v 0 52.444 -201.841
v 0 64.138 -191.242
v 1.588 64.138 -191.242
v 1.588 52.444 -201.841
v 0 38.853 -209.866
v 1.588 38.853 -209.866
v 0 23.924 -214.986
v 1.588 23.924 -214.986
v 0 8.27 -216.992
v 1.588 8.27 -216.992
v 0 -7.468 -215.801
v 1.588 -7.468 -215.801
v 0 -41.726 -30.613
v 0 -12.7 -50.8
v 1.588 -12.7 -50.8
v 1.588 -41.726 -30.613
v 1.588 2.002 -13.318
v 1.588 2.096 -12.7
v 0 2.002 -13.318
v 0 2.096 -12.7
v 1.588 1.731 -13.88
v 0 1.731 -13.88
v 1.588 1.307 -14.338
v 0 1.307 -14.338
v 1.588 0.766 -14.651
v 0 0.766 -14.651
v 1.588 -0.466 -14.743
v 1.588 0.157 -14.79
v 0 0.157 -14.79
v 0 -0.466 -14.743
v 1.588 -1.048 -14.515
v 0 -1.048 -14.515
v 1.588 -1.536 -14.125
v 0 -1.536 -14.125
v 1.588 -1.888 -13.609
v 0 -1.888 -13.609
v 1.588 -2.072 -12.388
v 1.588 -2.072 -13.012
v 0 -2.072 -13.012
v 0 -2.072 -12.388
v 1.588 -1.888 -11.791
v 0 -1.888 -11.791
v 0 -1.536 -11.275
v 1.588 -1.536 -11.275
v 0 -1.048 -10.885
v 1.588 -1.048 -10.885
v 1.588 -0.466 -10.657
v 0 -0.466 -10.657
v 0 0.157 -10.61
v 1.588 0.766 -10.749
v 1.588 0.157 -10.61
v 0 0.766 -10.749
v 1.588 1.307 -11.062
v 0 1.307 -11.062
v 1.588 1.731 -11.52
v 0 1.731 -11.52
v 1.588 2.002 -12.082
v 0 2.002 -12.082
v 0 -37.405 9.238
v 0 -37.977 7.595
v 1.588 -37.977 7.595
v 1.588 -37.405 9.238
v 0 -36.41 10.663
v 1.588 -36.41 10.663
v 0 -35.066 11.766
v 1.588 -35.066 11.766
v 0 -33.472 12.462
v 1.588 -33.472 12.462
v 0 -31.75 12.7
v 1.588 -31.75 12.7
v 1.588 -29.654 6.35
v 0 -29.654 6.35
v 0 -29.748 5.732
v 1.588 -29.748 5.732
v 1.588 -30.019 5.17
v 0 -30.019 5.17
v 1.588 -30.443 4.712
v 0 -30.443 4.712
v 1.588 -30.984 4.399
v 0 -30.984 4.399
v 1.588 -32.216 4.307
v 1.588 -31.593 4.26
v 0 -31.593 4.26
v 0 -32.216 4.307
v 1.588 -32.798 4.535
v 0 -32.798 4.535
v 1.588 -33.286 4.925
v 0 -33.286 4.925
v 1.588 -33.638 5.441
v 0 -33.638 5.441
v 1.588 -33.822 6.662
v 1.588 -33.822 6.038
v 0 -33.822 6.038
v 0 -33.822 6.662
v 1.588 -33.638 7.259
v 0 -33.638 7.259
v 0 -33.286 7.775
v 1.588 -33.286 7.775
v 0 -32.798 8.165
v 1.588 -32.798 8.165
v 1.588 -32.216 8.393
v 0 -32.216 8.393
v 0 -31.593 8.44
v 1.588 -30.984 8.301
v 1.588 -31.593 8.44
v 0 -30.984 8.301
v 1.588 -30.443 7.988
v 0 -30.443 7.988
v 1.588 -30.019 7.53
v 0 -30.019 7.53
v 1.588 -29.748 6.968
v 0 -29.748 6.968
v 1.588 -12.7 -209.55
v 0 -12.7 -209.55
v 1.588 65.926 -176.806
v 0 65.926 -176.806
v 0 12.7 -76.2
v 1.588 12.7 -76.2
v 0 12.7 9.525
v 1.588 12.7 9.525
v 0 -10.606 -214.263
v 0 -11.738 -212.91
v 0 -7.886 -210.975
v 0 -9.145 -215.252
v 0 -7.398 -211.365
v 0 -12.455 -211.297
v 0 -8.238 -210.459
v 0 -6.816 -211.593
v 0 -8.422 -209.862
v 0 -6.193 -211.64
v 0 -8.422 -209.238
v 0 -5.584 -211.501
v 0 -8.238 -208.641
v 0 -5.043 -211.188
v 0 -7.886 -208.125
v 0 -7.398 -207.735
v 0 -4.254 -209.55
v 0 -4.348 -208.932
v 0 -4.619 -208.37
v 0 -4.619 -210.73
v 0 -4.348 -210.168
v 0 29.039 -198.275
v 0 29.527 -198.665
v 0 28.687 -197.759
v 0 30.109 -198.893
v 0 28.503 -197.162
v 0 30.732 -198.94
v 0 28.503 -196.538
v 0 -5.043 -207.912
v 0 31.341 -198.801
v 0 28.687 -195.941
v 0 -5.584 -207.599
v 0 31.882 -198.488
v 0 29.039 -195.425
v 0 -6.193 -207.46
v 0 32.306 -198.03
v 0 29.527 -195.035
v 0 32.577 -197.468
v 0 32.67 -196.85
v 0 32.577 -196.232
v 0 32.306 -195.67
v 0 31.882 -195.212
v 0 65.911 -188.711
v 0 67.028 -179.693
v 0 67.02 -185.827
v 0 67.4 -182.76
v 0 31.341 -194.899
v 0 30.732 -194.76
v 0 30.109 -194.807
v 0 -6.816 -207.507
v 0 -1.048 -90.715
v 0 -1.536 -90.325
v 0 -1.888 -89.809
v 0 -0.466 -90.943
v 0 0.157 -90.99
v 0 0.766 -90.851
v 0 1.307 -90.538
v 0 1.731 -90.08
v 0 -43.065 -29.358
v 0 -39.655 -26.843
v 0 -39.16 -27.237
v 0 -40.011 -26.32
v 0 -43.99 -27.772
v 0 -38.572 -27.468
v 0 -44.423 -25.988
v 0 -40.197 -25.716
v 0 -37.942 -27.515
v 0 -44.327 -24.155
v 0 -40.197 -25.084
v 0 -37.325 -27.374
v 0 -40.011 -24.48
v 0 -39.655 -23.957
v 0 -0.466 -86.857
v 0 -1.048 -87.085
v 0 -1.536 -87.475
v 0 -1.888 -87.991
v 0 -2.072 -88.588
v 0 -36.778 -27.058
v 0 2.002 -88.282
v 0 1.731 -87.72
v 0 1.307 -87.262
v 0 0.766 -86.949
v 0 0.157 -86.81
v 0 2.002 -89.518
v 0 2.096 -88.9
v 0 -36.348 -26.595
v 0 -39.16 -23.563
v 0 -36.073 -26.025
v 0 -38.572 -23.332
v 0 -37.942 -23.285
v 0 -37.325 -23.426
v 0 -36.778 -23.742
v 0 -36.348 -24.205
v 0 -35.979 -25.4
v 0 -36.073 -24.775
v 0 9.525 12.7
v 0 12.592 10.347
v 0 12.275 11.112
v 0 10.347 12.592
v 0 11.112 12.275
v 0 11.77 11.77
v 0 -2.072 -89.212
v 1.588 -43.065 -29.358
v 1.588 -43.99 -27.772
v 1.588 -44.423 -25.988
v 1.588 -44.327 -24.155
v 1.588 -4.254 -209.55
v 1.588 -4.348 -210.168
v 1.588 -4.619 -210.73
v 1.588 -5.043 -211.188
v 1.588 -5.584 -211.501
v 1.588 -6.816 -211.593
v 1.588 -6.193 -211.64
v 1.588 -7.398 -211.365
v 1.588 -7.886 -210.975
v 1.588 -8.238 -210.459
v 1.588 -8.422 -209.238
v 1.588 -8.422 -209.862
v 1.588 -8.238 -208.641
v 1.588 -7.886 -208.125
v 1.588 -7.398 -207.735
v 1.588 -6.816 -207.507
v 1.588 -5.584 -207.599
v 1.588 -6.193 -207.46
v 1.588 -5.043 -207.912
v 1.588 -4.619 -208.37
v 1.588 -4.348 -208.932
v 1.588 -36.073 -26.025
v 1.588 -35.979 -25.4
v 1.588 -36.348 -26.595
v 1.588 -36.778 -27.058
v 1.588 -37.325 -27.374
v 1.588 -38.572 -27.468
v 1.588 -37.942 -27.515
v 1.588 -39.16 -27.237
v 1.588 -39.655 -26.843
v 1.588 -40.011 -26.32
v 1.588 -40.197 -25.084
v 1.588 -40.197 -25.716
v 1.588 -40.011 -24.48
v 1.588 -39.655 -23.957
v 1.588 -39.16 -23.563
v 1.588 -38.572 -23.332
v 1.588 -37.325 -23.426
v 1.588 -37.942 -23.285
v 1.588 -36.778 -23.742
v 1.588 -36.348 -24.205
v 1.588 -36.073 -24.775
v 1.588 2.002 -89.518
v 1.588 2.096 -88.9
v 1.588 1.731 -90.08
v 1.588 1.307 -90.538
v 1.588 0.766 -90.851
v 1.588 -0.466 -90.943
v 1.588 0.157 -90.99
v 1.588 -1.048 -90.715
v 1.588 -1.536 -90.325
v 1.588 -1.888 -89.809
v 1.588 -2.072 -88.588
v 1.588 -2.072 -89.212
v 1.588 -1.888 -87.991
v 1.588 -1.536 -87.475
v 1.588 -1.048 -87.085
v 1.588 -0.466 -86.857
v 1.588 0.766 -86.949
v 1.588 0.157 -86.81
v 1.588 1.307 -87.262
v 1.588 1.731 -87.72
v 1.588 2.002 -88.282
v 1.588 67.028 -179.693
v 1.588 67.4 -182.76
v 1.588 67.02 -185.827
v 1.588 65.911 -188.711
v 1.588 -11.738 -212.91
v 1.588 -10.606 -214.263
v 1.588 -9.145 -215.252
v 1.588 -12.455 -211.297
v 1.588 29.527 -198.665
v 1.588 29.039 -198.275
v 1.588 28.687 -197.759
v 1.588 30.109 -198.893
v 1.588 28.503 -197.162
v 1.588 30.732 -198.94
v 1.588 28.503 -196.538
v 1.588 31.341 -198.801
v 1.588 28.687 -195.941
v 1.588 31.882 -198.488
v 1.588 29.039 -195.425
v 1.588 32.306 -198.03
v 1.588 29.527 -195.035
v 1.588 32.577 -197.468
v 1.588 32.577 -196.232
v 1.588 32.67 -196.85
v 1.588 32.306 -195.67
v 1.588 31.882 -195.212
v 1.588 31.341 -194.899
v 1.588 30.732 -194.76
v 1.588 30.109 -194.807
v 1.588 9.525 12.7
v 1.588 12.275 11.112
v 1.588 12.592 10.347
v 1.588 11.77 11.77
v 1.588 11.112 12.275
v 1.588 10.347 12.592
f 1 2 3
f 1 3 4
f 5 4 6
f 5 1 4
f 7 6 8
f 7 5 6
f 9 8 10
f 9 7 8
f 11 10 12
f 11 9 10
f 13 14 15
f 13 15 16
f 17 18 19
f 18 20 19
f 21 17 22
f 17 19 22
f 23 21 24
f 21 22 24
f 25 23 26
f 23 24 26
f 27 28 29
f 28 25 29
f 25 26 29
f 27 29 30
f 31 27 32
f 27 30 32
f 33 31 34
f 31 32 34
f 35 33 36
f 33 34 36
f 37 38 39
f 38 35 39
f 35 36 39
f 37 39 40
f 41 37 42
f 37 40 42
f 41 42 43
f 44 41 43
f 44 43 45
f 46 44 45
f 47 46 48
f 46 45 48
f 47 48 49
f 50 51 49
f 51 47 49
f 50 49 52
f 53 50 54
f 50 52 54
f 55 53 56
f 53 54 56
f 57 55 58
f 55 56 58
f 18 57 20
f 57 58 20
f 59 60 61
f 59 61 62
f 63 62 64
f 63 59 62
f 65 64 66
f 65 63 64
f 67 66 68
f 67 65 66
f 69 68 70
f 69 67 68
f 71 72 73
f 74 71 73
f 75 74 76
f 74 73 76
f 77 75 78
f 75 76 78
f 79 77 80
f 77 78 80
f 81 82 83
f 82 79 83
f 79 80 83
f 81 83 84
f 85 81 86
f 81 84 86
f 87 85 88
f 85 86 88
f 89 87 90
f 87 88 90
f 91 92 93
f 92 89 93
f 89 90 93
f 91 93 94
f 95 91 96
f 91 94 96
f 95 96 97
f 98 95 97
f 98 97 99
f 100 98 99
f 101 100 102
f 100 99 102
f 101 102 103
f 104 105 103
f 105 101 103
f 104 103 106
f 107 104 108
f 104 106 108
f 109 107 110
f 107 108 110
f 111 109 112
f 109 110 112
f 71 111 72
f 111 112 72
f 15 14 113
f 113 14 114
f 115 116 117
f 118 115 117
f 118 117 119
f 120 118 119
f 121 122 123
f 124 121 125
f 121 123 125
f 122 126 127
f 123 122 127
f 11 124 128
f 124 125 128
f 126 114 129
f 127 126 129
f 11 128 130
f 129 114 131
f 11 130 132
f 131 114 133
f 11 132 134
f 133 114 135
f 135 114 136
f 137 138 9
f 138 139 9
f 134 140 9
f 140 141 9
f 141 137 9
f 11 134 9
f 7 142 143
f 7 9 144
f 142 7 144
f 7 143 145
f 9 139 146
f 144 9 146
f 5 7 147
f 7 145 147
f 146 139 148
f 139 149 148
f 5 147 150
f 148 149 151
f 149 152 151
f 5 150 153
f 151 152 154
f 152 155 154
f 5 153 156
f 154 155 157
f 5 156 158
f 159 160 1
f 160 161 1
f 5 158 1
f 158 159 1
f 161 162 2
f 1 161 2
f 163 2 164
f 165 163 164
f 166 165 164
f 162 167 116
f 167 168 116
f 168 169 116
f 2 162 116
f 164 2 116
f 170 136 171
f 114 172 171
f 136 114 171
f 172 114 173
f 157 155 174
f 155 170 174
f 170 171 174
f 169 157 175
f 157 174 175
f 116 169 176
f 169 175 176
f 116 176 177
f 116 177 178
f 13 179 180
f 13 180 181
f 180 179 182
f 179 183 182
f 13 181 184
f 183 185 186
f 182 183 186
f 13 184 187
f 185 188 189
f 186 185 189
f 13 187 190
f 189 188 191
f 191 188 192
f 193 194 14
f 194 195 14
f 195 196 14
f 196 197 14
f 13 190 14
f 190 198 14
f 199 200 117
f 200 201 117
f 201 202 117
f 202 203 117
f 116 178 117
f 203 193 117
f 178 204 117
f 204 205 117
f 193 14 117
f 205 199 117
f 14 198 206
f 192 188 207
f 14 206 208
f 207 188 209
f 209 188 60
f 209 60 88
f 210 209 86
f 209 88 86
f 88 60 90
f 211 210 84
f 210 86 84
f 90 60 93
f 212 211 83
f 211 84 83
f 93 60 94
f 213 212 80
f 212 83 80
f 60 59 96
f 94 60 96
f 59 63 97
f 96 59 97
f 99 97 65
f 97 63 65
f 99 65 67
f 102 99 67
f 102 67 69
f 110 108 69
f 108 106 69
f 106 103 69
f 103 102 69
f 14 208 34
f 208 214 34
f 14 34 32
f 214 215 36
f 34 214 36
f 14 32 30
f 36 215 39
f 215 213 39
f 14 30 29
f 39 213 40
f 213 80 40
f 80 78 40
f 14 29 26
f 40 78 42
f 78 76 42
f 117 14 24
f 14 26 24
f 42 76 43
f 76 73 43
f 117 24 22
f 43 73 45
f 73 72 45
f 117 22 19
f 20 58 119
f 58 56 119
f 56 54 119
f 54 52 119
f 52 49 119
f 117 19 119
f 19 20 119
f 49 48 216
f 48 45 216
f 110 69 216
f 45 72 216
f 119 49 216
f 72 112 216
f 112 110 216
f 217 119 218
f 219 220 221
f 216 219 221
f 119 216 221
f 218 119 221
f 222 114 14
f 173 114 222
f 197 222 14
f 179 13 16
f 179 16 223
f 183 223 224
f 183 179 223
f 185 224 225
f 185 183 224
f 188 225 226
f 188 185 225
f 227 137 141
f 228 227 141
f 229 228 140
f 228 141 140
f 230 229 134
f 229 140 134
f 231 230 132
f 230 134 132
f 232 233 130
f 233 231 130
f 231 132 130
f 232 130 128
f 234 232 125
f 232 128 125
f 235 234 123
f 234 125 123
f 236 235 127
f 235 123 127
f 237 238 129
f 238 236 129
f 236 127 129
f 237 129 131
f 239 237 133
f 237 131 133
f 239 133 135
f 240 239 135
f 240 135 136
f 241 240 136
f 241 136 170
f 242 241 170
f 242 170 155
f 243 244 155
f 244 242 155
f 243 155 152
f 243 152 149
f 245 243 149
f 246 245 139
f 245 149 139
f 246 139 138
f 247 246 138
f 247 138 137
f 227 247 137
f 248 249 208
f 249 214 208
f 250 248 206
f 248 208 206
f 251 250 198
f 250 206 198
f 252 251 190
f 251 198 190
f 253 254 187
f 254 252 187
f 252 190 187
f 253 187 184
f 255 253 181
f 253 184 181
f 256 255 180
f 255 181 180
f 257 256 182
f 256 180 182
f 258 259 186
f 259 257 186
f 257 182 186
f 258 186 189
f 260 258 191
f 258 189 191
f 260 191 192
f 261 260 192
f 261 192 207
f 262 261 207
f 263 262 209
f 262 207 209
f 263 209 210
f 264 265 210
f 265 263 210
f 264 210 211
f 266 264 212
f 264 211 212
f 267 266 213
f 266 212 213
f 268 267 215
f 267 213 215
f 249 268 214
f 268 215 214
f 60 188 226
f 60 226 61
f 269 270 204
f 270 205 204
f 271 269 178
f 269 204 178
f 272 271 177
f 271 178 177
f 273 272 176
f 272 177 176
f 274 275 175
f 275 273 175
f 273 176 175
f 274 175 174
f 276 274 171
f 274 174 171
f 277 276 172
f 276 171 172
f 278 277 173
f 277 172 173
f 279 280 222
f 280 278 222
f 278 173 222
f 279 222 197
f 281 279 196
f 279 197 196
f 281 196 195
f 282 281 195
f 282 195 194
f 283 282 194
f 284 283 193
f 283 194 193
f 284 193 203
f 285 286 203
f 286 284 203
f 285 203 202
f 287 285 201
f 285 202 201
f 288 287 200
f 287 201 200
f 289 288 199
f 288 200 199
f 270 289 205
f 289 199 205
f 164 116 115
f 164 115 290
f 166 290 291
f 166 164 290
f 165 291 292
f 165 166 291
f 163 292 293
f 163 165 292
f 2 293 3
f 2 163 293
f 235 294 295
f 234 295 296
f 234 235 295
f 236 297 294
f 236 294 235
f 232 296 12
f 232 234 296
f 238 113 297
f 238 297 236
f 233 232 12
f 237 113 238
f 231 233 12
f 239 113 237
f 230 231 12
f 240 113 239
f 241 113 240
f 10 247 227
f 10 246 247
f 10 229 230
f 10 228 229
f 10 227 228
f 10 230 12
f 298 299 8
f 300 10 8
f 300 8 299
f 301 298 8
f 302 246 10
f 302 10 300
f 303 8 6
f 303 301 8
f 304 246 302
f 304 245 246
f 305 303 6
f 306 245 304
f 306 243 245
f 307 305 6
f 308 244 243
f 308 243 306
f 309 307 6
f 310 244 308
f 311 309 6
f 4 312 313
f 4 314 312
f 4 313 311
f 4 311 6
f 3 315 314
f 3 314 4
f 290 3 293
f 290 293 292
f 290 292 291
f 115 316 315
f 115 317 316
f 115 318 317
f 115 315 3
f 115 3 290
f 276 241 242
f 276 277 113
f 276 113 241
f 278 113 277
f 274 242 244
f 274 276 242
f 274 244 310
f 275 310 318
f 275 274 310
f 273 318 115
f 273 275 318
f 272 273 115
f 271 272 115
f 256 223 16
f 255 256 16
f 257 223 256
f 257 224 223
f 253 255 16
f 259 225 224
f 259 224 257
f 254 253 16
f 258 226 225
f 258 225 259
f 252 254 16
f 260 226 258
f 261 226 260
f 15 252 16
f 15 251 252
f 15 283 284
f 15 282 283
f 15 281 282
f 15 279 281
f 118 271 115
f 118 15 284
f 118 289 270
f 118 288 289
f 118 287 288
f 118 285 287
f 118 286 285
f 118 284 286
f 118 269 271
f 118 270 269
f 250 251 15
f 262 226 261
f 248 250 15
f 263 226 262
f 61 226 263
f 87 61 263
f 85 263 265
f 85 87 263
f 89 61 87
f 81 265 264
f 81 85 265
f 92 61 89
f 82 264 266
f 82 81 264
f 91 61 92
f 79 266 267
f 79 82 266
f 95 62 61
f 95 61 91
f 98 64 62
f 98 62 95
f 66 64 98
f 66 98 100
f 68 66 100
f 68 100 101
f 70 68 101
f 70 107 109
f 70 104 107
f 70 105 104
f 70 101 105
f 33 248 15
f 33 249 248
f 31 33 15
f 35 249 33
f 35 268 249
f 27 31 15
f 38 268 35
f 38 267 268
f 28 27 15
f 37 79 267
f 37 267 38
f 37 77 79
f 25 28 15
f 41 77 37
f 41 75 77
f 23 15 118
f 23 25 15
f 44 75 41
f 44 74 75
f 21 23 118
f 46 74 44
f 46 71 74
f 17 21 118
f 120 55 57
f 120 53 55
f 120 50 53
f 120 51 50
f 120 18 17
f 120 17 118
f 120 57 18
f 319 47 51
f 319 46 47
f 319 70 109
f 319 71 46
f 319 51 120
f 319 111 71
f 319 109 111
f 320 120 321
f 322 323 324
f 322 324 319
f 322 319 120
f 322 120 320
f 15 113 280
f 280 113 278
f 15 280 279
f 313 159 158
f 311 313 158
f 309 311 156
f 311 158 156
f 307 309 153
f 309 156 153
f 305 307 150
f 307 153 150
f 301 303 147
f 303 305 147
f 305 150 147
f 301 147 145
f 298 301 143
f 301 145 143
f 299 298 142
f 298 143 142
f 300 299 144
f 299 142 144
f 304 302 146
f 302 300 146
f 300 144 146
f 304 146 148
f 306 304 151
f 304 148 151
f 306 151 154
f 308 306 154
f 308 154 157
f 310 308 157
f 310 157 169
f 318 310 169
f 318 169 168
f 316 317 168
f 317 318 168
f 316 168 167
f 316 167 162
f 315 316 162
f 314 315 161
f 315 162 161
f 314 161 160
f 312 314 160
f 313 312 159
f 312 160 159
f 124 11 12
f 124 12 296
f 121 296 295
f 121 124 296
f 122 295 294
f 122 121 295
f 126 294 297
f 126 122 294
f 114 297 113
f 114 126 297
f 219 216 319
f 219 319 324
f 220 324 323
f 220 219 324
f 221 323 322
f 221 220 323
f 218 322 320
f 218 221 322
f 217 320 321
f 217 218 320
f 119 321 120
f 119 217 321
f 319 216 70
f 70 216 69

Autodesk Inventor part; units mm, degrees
ref_plane "YZ Plane" through (0, 0, 0) normal (1, 0, 0) x (0, 1, 0)
ref_plane "XZ Plane" through (0, 0, 0) normal (0, 1, 0) x (-1, 0, 0)
ref_plane "XY Plane" through (0, 0, 0) normal (0, 0, 1) x (1, 0, 0)
sketch "main" plane through (0, 0, 0) normal (0, 0, 1) x (1, 0, 0)
  circle A0 centre (-31.9195, -99.4713) radius 2.0955
  arc A1 (-38.2695, -99.4713) -> (-33.0376, -105.722) centre (-31.9195, -99.4713) ccw
  arc A2 (-33.0376, -105.722) -> (38.5686, -81.1636) centre (-19.3218, -29.0418) ccw
  line L0 (40.3562, -66.7269) -> (-12.8695, 33.8787)
  line L1 (-12.8695, 33.8787) -> (-12.8695, 119.6037)
  line L2 (-16.0445, 122.7787) -> (-57.3195, 122.7787)
  line L3 (-38.2695, 59.2787) -> (-38.2695, -99.4713)
  arc A3 (38.5686, -81.1636) -> (40.3562, -66.7269) centre (29.1304, -72.6659) ccw
  circle A4 centre (-25.5695, 21.1787) radius 2.0955
  arc A5 (-12.8695, 119.6037) -> (-16.0445, 122.7787) centre (-16.0445, 119.6037) ccw
  circle A6 centre (5.0055, -86.7713) radius 2.0955
  line L4 (-38.2695, 59.2787) -> (-67.8233, 79.8329)
  circle A7 centre (-63.6695, 84.6787) radius 2.1209
  arc A8 (-69.8962, 85.9241) -> (-67.2952, 79.4656) centre (-63.6695, 84.6787) ccw
  circle A9 centre (-57.3195, 116.4287) radius 2.0955
  arc A10 (-57.3195, 122.7787) -> (-63.5462, 117.6741) centre (-57.3195, 116.4287) ccw
  line L5 (-69.8962, 85.9241) -> (-63.5462, 117.6741)
  circle A11 centre (-25.5695, 97.3787) radius 2.0955
  point P0 (-9.1863, -18.3686)
  point P1 (44.2418, -74.0713)
  dimension "d0" = 4.191
  dimension "d1" = 12.7
  dimension "d3" = 4.191
  dimension "d4" = 3.175
  dimension "d5" = 4.191
  dimension "d12" = 4.2418
  dimension "d14" = 4.191
  dimension "d16" = 158.75
  dimension "d17" = 4.191
sketch "Sketch1" plane through (0, 0, 0) normal (1, 0, 0) x (0, 1, 0)
  circle A0 centre (-6.35, -209.55) radius 2.0955
  arc A1 (-12.7, -209.55) -> (-7.4681, -215.8008) centre (-6.35, -209.55) ccw
  arc A2 (-7.4681, -215.8008) -> (64.1381, -191.2423) centre (6.2477, -139.1205) ccw
  line L0 (65.9257, -176.8056) -> (12.7, -76.2)
  line L1 (12.7, -76.2) -> (12.7, 9.525)
  line L2 (9.525, 12.7) -> (-31.75, 12.7)
  line L3 (-12.7, -50.8) -> (-12.7, -209.55)
  arc A3 (64.1381, -191.2423) -> (65.9257, -176.8056) centre (54.7, -182.7446) ccw
  circle A4 centre (0, -88.9) radius 2.0955
  arc A5 (12.7, 9.525) -> (9.525, 12.7) centre (9.525, 9.525) ccw
  circle A6 centre (30.575, -196.85) radius 2.0955
  line L4 (-12.7, -50.8) -> (-42.2538, -30.2459)
  circle A7 centre (-38.1, -25.4) radius 2.1209
  arc A8 (-44.3267, -24.1547) -> (-41.7257, -30.6132) centre (-38.1, -25.4) ccw
  circle A9 centre (-31.75, 6.35) radius 2.0955
  arc A10 (-31.75, 12.7) -> (-37.9767, 7.5953) centre (-31.75, 6.35) ccw
  line L5 (-44.3267, -24.1547) -> (-37.9767, 7.5953)
  circle A11 centre (0, -12.7) radius 2.0955
  point P0 (0, 0)
extrude "Extrusion1" add sketch "Sketch1" along normal blind 1.5875
equation "\"BendRadius\" = Thickness"
equation "\"BendReliefWidth\" = Thickness"
equation "\"BendReliefDepth\" = 0.5 * Thickness"
equation "\"CornerReliefSize\" = 4 * Thickness"
equation "\"MinimumRemnant\" = 2 * Thickness"
equation "\"TransitionRadius\" = BendRadius"
equation "\"JacobiRadiusSize\" = BendRadius"
equation "\"GapSize\" = Thickness"
equation "\"Thickness\" = 1.5875"
properties part number "gusset" material "Acetal Resin, White"
